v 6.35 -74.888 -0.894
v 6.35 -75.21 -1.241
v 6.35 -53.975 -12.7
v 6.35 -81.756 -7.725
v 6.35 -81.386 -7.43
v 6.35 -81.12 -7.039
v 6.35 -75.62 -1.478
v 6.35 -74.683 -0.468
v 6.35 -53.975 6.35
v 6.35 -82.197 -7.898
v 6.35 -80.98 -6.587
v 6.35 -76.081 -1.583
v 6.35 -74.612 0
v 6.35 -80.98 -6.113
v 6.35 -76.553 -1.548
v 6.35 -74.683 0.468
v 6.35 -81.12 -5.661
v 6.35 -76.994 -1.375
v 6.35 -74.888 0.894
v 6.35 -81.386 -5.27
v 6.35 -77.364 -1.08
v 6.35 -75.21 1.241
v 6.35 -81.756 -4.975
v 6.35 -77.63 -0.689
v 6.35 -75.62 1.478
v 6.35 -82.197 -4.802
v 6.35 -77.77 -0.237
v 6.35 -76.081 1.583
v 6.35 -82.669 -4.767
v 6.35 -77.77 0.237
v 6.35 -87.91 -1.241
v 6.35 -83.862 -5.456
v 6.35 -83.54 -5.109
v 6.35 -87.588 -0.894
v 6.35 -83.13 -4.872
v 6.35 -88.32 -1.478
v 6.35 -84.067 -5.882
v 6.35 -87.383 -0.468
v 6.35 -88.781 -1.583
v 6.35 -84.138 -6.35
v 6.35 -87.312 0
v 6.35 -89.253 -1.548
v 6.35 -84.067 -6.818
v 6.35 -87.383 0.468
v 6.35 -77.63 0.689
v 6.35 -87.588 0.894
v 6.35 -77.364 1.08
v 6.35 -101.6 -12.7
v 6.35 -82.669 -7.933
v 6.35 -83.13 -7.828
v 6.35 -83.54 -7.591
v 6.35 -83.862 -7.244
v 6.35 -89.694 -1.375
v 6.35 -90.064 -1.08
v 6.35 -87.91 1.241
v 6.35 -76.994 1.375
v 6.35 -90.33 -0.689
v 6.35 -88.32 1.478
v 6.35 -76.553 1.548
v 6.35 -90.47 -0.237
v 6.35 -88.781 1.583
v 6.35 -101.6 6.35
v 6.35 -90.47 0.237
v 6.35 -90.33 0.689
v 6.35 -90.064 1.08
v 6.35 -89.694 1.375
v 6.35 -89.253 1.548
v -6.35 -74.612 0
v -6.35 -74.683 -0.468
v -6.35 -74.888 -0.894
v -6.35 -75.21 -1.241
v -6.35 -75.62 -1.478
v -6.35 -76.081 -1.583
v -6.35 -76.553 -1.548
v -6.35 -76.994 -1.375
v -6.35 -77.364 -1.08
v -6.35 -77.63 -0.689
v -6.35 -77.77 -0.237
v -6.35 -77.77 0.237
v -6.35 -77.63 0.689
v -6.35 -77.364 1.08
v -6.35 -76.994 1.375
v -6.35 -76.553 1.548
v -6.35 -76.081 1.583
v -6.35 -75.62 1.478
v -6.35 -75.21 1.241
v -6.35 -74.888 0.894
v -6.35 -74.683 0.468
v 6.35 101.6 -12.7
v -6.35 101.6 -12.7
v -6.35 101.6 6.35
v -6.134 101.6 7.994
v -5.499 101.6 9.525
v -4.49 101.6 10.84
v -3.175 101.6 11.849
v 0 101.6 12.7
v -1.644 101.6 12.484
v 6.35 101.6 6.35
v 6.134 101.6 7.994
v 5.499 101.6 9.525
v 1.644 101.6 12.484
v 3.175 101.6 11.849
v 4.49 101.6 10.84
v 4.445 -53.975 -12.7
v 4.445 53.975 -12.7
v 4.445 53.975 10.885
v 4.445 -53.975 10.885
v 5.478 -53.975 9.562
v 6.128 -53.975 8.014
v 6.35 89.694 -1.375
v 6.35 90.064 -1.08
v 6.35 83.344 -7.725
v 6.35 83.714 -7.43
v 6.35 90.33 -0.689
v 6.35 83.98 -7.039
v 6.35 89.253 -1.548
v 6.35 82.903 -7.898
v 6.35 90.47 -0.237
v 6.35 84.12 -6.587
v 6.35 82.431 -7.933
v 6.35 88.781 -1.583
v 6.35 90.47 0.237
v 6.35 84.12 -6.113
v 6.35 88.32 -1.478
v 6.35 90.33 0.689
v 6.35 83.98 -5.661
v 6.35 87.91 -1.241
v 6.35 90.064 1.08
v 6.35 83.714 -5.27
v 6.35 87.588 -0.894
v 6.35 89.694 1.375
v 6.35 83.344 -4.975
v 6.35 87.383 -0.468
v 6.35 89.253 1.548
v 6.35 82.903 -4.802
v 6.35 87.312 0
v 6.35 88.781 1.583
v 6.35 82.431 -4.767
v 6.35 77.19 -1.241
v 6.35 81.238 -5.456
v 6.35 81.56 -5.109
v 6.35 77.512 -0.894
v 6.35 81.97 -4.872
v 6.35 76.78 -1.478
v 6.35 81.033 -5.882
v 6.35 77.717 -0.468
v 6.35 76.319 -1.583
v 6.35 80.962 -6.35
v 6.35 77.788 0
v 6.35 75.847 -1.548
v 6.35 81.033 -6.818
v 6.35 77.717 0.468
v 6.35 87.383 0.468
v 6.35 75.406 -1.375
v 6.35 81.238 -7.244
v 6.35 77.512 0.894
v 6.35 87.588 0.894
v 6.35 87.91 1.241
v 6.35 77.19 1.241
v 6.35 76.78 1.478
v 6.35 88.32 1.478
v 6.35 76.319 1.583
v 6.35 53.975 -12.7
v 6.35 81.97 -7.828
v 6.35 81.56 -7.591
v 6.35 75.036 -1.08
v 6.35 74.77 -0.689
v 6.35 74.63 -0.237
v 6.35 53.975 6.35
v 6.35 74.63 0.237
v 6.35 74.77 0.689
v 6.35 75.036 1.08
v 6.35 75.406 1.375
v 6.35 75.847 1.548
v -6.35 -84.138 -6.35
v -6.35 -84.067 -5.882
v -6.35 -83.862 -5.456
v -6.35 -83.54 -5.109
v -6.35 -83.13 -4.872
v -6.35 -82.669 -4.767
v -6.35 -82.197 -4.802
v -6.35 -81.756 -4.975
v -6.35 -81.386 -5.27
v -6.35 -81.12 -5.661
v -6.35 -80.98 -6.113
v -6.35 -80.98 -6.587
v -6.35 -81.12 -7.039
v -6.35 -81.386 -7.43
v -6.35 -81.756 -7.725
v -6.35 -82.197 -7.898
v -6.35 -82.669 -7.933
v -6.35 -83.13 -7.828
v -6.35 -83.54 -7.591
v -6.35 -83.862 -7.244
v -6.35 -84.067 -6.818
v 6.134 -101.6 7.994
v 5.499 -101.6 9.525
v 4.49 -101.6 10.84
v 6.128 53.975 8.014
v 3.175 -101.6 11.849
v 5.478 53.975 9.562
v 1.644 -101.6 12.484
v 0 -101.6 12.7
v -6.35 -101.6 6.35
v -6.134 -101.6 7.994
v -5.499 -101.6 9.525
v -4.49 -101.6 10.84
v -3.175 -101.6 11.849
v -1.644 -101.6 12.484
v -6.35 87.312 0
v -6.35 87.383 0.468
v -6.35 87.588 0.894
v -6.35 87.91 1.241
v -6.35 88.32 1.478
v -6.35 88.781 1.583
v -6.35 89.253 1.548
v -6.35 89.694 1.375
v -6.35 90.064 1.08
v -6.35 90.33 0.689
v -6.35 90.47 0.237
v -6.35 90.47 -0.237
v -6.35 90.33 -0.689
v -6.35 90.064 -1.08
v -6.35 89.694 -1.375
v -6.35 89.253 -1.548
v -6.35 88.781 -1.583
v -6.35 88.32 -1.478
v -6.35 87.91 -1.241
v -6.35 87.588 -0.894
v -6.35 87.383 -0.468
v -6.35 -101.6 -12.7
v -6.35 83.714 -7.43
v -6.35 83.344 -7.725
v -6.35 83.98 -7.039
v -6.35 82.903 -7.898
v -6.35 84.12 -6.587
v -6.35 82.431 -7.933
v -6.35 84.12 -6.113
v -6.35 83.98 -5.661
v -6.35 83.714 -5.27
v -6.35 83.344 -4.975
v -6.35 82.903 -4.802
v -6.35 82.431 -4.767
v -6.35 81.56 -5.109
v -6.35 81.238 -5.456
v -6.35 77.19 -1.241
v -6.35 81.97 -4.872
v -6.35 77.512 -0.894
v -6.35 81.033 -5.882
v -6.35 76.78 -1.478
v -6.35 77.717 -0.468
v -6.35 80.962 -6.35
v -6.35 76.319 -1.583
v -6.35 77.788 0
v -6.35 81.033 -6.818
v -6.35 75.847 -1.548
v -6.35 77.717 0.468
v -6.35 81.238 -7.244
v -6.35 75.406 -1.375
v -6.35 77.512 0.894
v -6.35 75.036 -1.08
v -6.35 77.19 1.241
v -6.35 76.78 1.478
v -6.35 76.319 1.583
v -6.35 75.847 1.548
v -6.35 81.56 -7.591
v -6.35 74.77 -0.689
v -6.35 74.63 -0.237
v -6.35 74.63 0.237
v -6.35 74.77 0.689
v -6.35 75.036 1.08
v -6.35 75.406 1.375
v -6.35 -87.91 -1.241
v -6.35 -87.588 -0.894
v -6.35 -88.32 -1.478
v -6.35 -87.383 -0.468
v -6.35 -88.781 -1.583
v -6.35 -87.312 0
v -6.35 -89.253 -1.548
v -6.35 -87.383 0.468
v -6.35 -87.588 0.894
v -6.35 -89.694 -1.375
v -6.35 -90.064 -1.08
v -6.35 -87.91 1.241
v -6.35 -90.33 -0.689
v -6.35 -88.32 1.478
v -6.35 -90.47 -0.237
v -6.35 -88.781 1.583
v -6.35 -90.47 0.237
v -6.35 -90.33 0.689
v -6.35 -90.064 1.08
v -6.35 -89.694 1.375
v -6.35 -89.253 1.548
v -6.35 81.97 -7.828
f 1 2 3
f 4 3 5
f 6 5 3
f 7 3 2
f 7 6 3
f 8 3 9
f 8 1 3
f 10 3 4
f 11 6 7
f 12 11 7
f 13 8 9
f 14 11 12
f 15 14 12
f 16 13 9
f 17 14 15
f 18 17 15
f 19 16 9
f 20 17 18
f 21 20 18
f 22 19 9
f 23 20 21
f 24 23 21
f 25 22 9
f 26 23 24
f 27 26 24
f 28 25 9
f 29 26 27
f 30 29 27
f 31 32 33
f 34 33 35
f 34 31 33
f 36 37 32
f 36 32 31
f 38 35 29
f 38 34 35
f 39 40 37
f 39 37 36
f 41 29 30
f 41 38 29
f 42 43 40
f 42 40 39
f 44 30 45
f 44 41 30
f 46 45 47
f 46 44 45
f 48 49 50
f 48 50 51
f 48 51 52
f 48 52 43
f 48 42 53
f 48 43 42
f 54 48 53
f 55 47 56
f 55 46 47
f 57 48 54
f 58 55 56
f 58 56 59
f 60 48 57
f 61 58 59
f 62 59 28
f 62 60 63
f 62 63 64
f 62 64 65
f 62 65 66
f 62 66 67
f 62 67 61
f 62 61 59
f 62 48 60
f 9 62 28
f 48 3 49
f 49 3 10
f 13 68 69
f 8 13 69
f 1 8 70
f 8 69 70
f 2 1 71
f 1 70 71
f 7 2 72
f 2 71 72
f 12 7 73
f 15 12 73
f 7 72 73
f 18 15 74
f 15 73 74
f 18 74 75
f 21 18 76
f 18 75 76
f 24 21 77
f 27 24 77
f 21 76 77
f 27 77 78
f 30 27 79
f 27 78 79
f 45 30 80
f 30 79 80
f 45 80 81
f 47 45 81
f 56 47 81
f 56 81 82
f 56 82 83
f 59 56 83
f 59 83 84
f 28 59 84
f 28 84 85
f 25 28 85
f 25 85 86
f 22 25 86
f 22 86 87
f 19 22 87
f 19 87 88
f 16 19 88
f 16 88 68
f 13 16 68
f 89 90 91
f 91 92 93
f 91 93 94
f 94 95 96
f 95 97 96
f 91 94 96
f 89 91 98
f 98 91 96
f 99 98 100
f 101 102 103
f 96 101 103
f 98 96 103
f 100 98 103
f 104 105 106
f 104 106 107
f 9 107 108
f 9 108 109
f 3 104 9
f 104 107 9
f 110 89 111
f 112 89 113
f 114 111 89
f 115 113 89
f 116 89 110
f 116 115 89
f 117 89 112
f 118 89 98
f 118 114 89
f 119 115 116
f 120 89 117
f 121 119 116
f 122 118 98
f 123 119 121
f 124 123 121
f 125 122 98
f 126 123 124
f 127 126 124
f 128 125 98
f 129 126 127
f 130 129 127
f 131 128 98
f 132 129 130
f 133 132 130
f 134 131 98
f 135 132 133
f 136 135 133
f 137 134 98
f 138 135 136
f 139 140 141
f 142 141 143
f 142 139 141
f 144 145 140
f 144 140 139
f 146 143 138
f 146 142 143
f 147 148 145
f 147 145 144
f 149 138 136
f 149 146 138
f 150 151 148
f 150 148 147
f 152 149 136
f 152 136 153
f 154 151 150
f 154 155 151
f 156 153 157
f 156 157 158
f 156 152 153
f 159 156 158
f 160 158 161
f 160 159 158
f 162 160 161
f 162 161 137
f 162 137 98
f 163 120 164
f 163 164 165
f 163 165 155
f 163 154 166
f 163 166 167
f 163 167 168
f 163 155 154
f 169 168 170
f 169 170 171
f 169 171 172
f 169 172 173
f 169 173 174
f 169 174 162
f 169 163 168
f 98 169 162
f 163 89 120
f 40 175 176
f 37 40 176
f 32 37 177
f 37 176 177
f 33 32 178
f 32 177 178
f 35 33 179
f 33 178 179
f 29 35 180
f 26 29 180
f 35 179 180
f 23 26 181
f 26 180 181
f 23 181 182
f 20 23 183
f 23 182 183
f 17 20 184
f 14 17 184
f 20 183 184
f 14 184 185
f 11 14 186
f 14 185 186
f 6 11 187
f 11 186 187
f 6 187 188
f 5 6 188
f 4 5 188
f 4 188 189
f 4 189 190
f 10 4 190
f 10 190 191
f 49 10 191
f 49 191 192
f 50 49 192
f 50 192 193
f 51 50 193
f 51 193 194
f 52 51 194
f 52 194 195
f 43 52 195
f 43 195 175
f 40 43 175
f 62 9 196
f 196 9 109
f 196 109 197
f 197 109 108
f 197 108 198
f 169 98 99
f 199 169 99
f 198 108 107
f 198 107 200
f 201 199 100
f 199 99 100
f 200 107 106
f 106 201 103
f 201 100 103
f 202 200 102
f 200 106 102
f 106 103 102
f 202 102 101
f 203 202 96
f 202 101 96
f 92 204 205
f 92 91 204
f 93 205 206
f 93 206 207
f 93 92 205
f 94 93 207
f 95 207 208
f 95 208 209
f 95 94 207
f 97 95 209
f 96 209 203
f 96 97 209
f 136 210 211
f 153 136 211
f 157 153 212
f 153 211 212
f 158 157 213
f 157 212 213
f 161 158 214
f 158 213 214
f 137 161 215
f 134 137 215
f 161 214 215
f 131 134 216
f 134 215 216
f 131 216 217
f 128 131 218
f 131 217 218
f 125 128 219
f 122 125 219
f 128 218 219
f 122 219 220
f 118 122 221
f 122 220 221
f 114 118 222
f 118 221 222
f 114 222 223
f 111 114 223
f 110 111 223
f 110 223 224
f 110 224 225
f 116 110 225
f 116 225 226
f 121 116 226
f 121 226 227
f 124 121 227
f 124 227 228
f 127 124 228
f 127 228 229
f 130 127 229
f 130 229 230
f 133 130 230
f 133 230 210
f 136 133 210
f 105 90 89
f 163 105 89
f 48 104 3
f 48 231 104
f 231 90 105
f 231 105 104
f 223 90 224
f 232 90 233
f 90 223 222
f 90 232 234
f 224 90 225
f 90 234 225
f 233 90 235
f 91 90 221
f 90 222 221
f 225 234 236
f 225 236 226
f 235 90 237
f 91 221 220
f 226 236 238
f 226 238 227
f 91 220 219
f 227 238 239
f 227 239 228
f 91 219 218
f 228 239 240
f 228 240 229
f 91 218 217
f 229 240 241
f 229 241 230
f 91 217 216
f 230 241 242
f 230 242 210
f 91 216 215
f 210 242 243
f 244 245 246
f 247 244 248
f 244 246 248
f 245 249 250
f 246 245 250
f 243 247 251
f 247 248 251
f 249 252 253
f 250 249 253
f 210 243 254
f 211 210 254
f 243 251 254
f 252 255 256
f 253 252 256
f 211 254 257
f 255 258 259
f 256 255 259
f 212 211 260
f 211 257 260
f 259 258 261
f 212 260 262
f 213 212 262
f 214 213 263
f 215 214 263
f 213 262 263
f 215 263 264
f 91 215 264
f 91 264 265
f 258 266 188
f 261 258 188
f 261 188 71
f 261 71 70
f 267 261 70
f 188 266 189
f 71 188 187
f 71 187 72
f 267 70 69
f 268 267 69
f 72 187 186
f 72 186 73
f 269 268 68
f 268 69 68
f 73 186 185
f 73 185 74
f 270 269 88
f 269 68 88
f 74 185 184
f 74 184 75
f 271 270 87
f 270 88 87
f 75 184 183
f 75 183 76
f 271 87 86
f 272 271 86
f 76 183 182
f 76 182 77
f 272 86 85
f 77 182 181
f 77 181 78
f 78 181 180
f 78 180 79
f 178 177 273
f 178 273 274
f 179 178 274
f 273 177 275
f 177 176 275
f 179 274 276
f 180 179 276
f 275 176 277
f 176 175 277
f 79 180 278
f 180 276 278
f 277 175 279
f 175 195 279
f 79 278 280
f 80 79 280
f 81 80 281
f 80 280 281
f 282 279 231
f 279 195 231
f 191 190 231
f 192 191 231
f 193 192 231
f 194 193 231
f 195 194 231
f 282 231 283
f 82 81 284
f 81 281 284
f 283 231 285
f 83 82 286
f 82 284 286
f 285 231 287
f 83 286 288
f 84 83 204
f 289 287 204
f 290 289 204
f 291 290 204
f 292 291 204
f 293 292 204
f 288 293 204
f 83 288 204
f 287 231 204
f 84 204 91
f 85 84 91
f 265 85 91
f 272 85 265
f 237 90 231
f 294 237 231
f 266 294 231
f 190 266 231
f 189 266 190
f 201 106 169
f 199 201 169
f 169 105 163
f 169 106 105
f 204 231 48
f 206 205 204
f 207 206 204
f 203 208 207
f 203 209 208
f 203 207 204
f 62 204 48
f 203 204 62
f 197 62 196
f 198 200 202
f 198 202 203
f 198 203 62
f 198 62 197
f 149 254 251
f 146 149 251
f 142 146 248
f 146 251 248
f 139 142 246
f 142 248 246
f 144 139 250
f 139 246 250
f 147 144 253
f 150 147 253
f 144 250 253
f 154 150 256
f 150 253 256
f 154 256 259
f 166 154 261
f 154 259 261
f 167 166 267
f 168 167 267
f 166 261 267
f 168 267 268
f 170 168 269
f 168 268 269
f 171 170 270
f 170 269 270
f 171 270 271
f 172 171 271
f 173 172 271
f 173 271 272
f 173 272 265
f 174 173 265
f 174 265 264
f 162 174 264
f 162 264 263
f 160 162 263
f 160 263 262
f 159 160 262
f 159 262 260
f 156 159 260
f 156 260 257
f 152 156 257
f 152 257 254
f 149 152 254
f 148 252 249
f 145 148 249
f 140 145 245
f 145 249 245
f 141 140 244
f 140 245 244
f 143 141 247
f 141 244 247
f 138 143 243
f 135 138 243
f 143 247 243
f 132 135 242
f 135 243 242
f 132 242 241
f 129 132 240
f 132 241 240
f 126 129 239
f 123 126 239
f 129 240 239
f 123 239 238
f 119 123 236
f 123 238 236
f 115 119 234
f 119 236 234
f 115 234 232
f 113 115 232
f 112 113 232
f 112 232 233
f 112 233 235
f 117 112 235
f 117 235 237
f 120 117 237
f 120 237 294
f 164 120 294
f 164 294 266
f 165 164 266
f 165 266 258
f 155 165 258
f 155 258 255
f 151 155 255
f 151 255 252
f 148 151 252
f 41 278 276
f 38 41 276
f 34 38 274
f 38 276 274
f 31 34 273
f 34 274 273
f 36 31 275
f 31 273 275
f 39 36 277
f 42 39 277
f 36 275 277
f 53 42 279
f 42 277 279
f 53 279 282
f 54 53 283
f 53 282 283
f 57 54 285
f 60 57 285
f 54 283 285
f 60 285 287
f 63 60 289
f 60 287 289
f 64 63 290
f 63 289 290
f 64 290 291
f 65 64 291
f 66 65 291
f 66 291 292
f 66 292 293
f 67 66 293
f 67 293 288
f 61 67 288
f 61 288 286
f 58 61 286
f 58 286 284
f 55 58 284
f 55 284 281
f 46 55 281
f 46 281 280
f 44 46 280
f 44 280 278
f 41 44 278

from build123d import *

# Parameters (mm, degrees)
F0_W     = 12.7
F0_H     = 25.4
F1_DEPTH = 101.6
F2_R     = 6.34999
F3_R     = 1.5875
F4_DEPTH = 25.4
F5_W     = 3.81
F5_H     = 107.95
F6_DEPTH = 25.4


# Not quite as in the source:
# - a fillet or chamfer is up to 0.001 mm smaller than in the source, because OpenCascade refuses the exact size


with BuildPart() as f1:
    # F0 (on Front) → F1 (new body, symmetric)
    with BuildSketch(Plane.XZ):
        Rectangle(F0_W, F0_H)
    extrude(amount=F1_DEPTH, both=True)

    # F2 (radius 6.35 in the source; OpenCascade refuses exactly that, so slightly less here)
    f2_edges = [f1.edges().sort_by_distance(p)[0] for p in [
        (-6.35, 0, 12.7),
        (6.35, 0, 12.7),
    ]]
    fillet(f2_edges, radius=F2_R)

    # F3 (on face) → F4 (cut)
    with BuildSketch(Plane(origin=(-6.35, 0, 0), x_dir=(0, -1, 0), z_dir=(-1, 0, 0))):
        with BuildLine():
            Line((-77.7875, 0), (-74.6125, 0))
            ThreePointArc((-74.6125, 0), (-76.2, 1.5875), (-77.7875, 0))
        make_face()
        with Locations((-88.9, 0)):
            Circle(F3_R)
        with BuildLine():
            ThreePointArc((90.4875, 0), (88.9, 1.5875), (87.3125, 0))
            ThreePointArc((87.3125, 0), (88.9, -1.5875), (90.4875, 0))
        make_face()
        with BuildLine():
            ThreePointArc((77.7875, 0), (76.2, 1.5875), (74.6125, 0))
            Line((74.6125, 0), (77.7875, 0))
        make_face()
        with BuildLine():
            Line((77.7875, 0), (74.6125, 0))
            ThreePointArc((74.6125, 0), (76.2, -1.5875), (77.7875, 0))
        make_face()
        with BuildLine():
            ThreePointArc((-77.7875, 0), (-76.2, -1.5875), (-74.6125, 0))
            Line((-74.6125, 0), (-77.7875, 0))
        make_face()
        with Locations((-82.55, -6.35)):
            Circle(F3_R)
        with Locations((82.55, -6.35)):
            Circle(F3_R)
    extrude(amount=-F4_DEPTH, mode=Mode.SUBTRACT)

    # F5 (on face) → F6 (cut)
    with BuildSketch(Plane(origin=(0, 0, -12.7), x_dir=(1, 0, 0), z_dir=(0, 0, -1))):
        with Locations((6.35, 0)):
            Rectangle(F5_W, F5_H)
    extrude(amount=-F6_DEPTH, mode=Mode.SUBTRACT)


solid = f1.part
